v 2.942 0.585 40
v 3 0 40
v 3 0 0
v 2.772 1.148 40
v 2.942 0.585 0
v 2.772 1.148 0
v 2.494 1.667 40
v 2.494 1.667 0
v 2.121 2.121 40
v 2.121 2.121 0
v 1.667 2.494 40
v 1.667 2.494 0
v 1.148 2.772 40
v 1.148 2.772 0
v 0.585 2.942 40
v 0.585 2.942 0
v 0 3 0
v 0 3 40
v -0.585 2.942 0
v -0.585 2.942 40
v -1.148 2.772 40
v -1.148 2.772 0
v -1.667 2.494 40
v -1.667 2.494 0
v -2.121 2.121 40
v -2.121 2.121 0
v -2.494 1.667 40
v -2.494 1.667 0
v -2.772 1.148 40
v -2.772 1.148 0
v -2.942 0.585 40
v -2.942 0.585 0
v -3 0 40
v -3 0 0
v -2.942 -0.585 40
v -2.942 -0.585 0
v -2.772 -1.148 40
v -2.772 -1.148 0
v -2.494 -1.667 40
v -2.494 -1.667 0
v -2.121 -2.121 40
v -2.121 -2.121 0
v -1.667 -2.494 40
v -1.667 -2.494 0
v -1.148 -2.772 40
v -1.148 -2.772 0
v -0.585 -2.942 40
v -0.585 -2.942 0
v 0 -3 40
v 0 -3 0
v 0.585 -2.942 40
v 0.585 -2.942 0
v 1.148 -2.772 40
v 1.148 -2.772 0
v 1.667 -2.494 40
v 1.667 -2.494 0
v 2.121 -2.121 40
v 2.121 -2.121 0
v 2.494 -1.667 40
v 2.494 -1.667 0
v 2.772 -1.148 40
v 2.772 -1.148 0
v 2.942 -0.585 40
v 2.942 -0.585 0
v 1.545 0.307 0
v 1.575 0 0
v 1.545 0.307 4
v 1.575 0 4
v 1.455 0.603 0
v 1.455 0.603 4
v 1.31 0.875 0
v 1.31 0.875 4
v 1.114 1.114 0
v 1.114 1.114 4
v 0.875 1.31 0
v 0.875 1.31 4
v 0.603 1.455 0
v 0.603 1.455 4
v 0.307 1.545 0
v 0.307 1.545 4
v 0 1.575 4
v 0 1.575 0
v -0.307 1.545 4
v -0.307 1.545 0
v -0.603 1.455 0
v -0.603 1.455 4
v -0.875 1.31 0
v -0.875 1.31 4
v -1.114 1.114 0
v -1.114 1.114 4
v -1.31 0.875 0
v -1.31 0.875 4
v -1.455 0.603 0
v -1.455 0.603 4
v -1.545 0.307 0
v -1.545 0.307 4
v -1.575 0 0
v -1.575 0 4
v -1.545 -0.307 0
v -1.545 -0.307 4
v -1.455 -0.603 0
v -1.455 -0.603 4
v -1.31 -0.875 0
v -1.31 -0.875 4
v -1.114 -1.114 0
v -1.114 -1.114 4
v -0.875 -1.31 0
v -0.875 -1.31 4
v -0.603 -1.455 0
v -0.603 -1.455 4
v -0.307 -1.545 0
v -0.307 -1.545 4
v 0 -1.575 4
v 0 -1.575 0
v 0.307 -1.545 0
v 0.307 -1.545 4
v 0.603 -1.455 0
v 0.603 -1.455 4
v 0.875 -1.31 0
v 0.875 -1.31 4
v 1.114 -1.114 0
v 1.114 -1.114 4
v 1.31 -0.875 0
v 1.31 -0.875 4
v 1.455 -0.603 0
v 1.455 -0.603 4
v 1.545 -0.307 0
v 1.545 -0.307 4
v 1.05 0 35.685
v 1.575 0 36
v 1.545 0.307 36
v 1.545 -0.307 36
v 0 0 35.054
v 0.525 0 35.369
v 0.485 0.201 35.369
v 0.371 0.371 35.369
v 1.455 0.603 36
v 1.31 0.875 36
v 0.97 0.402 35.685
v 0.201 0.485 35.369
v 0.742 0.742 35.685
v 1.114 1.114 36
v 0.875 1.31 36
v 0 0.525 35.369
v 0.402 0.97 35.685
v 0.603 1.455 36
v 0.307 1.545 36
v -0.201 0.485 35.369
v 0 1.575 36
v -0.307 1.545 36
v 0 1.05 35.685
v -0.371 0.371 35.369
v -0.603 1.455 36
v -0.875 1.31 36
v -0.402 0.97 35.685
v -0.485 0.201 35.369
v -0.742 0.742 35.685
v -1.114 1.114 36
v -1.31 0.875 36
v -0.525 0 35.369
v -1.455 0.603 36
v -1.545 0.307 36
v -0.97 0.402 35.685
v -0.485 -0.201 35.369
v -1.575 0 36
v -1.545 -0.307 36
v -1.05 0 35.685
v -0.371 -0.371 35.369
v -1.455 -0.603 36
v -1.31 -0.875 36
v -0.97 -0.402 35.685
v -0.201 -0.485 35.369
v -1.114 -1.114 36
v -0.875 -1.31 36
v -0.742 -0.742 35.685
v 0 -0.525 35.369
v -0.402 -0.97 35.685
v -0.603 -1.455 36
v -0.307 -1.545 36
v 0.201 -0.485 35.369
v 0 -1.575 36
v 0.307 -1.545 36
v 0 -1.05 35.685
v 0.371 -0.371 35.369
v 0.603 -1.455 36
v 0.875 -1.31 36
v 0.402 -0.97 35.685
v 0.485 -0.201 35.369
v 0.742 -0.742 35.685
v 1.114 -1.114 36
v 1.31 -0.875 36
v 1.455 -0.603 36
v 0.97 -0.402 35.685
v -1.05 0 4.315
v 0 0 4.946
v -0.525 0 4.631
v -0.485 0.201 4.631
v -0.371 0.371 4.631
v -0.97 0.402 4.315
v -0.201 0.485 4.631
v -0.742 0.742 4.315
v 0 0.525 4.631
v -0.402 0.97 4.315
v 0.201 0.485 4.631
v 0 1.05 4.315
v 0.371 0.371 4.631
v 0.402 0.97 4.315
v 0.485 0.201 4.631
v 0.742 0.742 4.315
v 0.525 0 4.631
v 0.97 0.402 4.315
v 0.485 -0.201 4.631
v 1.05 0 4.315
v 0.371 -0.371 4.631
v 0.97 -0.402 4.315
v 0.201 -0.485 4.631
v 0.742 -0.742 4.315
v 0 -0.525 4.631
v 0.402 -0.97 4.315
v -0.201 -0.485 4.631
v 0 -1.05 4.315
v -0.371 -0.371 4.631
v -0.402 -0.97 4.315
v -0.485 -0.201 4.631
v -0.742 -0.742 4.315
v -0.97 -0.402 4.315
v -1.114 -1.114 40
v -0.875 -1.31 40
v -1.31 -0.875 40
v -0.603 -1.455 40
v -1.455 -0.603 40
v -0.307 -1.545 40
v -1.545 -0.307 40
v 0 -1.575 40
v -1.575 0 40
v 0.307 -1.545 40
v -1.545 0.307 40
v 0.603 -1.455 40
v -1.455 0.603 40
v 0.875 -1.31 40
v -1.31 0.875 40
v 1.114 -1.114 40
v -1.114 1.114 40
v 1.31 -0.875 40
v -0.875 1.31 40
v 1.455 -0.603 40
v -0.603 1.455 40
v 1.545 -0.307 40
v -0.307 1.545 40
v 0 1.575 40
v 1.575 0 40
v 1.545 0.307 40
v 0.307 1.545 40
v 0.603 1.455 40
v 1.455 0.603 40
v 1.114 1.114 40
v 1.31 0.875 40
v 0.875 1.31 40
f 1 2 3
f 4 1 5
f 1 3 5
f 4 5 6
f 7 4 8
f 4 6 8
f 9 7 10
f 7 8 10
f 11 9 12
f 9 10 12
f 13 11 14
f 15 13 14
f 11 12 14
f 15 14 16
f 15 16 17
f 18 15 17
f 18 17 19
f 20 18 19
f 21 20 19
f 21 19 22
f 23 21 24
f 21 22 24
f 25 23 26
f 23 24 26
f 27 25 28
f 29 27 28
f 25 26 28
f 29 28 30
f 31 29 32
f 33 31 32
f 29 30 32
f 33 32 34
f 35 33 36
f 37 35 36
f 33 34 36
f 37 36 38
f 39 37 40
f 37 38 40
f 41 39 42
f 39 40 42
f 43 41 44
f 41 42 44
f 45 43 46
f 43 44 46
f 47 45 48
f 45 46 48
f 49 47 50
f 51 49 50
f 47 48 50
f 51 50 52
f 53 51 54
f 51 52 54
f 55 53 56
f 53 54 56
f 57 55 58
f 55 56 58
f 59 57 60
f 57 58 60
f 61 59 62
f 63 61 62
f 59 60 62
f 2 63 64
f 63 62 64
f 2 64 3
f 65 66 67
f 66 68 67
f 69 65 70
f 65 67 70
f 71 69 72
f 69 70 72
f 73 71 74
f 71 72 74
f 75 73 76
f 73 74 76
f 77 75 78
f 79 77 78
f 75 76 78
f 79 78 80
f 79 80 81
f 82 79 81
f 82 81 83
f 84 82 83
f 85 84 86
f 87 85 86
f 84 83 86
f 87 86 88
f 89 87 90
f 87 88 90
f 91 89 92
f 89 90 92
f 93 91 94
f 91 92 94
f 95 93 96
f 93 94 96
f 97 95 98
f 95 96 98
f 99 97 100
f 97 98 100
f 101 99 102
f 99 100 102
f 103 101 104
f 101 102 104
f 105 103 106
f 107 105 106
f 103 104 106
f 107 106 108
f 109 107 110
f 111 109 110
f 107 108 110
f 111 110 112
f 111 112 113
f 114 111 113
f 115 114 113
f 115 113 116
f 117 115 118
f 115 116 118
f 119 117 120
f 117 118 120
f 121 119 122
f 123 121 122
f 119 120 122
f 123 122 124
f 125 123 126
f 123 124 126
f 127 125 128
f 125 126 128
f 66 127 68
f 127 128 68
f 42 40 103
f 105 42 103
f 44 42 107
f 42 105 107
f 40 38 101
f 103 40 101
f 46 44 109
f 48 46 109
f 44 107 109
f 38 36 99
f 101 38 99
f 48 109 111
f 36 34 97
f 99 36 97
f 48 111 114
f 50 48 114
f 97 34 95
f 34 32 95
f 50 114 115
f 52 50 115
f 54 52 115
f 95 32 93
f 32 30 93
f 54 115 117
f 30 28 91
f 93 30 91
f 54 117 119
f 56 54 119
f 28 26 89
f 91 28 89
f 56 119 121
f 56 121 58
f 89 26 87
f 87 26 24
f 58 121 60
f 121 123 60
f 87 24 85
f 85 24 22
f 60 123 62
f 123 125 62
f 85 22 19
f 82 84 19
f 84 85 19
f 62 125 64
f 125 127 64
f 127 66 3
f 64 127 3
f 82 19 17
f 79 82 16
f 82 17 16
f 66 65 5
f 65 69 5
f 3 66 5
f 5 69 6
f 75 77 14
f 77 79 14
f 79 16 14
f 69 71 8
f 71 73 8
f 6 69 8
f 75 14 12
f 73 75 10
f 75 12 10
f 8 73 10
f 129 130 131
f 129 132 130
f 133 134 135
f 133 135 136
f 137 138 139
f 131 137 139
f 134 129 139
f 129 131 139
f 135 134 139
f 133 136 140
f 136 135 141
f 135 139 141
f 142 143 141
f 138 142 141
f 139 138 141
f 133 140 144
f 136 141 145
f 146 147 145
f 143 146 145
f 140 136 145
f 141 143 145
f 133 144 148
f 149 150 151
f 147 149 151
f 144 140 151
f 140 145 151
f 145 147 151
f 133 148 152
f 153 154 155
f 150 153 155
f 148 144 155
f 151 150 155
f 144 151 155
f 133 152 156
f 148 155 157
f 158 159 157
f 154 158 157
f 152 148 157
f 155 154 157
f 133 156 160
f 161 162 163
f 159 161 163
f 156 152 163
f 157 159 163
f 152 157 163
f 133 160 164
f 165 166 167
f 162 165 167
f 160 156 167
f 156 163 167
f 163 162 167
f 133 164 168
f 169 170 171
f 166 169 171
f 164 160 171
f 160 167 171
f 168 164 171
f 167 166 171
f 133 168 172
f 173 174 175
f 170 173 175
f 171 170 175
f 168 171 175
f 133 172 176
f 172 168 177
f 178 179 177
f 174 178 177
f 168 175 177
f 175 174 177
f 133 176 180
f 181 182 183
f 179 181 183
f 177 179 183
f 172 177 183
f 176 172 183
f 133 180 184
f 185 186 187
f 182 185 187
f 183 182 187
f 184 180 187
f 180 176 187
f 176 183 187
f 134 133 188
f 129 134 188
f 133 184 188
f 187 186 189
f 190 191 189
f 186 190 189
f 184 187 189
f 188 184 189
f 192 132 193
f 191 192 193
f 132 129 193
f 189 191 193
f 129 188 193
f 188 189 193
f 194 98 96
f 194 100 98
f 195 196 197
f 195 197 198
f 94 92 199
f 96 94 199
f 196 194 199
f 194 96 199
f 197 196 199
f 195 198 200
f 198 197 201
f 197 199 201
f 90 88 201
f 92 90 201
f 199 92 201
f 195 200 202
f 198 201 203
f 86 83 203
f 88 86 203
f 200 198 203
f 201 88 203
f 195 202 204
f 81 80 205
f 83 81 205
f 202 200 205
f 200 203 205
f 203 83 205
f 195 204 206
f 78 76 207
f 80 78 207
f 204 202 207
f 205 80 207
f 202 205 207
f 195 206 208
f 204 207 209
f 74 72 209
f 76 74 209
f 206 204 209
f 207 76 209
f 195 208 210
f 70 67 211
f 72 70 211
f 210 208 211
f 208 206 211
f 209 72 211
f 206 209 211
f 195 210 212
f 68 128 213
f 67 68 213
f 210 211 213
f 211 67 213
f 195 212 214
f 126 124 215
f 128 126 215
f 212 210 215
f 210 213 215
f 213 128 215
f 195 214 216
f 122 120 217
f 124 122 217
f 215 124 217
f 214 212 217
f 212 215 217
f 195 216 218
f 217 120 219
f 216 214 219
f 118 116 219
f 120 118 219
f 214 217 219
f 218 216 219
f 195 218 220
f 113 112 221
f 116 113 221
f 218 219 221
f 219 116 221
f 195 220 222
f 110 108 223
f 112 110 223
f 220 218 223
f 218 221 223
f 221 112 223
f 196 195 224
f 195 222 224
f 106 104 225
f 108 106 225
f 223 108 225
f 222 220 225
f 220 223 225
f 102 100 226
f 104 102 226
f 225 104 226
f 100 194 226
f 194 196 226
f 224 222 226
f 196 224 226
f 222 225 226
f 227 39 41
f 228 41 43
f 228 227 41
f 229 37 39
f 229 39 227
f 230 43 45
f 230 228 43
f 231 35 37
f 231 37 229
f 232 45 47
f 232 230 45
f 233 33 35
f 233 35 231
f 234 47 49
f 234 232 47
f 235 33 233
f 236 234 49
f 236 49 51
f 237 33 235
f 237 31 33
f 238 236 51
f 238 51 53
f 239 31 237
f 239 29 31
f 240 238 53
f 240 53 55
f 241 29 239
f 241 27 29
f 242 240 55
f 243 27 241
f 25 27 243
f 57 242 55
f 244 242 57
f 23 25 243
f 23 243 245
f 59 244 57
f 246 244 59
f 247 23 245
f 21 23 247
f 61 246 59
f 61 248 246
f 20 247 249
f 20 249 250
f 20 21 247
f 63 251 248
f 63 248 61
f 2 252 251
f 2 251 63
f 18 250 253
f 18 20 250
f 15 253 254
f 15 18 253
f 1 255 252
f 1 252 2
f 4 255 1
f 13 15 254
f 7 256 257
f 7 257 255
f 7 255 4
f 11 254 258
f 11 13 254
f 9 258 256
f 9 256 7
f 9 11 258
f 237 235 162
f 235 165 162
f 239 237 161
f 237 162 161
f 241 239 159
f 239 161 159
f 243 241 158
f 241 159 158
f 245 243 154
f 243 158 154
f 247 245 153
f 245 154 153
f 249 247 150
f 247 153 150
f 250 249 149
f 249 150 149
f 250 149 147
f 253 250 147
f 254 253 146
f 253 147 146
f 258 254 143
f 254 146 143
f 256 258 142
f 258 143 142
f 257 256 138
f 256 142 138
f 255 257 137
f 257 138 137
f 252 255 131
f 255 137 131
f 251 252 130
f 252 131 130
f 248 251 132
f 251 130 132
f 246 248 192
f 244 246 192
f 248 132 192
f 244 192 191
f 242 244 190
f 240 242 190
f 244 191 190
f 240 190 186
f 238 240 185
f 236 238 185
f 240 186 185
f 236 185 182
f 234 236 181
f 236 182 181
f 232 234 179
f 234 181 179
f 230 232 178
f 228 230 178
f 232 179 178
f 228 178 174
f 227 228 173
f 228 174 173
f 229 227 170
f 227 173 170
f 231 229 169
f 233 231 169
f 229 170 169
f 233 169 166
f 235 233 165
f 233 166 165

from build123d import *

# Parameters (mm, degrees)
ESBO_O1_R                                  = 3
RESSALTO_EXTRUS_O1_DEPTH                   = 40
BROCA_DE_ROSQUEAR_PARA_HELICOIDE_M31_D     = 3.15
BROCA_DE_ROSQUEAR_PARA_HELICOIDE_M31_DEPTH = 4
BROCA_DE_ROSQUEAR_PARA_HELICOIDE_M31_TIP   = 0.946355475
BROCA_DE_ROSQUEAR_PARA_HELICOIDE_M32_D     = 3.15
BROCA_DE_ROSQUEAR_PARA_HELICOIDE_M32_DEPTH = 4
BROCA_DE_ROSQUEAR_PARA_HELICOIDE_M32_TIP   = 0.946355475


with BuildPart() as part:
    # Esboço1 → Ressalto-extrusão1 (new body)
    with BuildSketch(Plane.XY):
        Circle(ESBO_O1_R)
    extrude(amount=RESSALTO_EXTRUS_O1_DEPTH)

    # Broca de rosquear para helicoide M31
    with Locations(Plane(origin=(0, 0, 0), x_dir=(-1, 0, 0), z_dir=(0, 0, -1))):
        with Locations((0, 0)):
            Hole(BROCA_DE_ROSQUEAR_PARA_HELICOIDE_M31_D / 2, depth=BROCA_DE_ROSQUEAR_PARA_HELICOIDE_M31_DEPTH)
            with Locations((0, 0, -(BROCA_DE_ROSQUEAR_PARA_HELICOIDE_M31_DEPTH + BROCA_DE_ROSQUEAR_PARA_HELICOIDE_M31_TIP / 2))):  # 118° drill point
                Cone(0, BROCA_DE_ROSQUEAR_PARA_HELICOIDE_M31_D / 2, BROCA_DE_ROSQUEAR_PARA_HELICOIDE_M31_TIP, mode=Mode.SUBTRACT)

    # Broca de rosquear para helicoide M32
    with Locations(Plane.XY.offset(40)):
        with Locations((0, 0)):
            Hole(BROCA_DE_ROSQUEAR_PARA_HELICOIDE_M32_D / 2, depth=BROCA_DE_ROSQUEAR_PARA_HELICOIDE_M32_DEPTH)
            with Locations((0, 0, -(BROCA_DE_ROSQUEAR_PARA_HELICOIDE_M32_DEPTH + BROCA_DE_ROSQUEAR_PARA_HELICOIDE_M32_TIP / 2))):  # 118° drill point
                Cone(0, BROCA_DE_ROSQUEAR_PARA_HELICOIDE_M32_D / 2, BROCA_DE_ROSQUEAR_PARA_HELICOIDE_M32_TIP, mode=Mode.SUBTRACT)


solid = part.part
